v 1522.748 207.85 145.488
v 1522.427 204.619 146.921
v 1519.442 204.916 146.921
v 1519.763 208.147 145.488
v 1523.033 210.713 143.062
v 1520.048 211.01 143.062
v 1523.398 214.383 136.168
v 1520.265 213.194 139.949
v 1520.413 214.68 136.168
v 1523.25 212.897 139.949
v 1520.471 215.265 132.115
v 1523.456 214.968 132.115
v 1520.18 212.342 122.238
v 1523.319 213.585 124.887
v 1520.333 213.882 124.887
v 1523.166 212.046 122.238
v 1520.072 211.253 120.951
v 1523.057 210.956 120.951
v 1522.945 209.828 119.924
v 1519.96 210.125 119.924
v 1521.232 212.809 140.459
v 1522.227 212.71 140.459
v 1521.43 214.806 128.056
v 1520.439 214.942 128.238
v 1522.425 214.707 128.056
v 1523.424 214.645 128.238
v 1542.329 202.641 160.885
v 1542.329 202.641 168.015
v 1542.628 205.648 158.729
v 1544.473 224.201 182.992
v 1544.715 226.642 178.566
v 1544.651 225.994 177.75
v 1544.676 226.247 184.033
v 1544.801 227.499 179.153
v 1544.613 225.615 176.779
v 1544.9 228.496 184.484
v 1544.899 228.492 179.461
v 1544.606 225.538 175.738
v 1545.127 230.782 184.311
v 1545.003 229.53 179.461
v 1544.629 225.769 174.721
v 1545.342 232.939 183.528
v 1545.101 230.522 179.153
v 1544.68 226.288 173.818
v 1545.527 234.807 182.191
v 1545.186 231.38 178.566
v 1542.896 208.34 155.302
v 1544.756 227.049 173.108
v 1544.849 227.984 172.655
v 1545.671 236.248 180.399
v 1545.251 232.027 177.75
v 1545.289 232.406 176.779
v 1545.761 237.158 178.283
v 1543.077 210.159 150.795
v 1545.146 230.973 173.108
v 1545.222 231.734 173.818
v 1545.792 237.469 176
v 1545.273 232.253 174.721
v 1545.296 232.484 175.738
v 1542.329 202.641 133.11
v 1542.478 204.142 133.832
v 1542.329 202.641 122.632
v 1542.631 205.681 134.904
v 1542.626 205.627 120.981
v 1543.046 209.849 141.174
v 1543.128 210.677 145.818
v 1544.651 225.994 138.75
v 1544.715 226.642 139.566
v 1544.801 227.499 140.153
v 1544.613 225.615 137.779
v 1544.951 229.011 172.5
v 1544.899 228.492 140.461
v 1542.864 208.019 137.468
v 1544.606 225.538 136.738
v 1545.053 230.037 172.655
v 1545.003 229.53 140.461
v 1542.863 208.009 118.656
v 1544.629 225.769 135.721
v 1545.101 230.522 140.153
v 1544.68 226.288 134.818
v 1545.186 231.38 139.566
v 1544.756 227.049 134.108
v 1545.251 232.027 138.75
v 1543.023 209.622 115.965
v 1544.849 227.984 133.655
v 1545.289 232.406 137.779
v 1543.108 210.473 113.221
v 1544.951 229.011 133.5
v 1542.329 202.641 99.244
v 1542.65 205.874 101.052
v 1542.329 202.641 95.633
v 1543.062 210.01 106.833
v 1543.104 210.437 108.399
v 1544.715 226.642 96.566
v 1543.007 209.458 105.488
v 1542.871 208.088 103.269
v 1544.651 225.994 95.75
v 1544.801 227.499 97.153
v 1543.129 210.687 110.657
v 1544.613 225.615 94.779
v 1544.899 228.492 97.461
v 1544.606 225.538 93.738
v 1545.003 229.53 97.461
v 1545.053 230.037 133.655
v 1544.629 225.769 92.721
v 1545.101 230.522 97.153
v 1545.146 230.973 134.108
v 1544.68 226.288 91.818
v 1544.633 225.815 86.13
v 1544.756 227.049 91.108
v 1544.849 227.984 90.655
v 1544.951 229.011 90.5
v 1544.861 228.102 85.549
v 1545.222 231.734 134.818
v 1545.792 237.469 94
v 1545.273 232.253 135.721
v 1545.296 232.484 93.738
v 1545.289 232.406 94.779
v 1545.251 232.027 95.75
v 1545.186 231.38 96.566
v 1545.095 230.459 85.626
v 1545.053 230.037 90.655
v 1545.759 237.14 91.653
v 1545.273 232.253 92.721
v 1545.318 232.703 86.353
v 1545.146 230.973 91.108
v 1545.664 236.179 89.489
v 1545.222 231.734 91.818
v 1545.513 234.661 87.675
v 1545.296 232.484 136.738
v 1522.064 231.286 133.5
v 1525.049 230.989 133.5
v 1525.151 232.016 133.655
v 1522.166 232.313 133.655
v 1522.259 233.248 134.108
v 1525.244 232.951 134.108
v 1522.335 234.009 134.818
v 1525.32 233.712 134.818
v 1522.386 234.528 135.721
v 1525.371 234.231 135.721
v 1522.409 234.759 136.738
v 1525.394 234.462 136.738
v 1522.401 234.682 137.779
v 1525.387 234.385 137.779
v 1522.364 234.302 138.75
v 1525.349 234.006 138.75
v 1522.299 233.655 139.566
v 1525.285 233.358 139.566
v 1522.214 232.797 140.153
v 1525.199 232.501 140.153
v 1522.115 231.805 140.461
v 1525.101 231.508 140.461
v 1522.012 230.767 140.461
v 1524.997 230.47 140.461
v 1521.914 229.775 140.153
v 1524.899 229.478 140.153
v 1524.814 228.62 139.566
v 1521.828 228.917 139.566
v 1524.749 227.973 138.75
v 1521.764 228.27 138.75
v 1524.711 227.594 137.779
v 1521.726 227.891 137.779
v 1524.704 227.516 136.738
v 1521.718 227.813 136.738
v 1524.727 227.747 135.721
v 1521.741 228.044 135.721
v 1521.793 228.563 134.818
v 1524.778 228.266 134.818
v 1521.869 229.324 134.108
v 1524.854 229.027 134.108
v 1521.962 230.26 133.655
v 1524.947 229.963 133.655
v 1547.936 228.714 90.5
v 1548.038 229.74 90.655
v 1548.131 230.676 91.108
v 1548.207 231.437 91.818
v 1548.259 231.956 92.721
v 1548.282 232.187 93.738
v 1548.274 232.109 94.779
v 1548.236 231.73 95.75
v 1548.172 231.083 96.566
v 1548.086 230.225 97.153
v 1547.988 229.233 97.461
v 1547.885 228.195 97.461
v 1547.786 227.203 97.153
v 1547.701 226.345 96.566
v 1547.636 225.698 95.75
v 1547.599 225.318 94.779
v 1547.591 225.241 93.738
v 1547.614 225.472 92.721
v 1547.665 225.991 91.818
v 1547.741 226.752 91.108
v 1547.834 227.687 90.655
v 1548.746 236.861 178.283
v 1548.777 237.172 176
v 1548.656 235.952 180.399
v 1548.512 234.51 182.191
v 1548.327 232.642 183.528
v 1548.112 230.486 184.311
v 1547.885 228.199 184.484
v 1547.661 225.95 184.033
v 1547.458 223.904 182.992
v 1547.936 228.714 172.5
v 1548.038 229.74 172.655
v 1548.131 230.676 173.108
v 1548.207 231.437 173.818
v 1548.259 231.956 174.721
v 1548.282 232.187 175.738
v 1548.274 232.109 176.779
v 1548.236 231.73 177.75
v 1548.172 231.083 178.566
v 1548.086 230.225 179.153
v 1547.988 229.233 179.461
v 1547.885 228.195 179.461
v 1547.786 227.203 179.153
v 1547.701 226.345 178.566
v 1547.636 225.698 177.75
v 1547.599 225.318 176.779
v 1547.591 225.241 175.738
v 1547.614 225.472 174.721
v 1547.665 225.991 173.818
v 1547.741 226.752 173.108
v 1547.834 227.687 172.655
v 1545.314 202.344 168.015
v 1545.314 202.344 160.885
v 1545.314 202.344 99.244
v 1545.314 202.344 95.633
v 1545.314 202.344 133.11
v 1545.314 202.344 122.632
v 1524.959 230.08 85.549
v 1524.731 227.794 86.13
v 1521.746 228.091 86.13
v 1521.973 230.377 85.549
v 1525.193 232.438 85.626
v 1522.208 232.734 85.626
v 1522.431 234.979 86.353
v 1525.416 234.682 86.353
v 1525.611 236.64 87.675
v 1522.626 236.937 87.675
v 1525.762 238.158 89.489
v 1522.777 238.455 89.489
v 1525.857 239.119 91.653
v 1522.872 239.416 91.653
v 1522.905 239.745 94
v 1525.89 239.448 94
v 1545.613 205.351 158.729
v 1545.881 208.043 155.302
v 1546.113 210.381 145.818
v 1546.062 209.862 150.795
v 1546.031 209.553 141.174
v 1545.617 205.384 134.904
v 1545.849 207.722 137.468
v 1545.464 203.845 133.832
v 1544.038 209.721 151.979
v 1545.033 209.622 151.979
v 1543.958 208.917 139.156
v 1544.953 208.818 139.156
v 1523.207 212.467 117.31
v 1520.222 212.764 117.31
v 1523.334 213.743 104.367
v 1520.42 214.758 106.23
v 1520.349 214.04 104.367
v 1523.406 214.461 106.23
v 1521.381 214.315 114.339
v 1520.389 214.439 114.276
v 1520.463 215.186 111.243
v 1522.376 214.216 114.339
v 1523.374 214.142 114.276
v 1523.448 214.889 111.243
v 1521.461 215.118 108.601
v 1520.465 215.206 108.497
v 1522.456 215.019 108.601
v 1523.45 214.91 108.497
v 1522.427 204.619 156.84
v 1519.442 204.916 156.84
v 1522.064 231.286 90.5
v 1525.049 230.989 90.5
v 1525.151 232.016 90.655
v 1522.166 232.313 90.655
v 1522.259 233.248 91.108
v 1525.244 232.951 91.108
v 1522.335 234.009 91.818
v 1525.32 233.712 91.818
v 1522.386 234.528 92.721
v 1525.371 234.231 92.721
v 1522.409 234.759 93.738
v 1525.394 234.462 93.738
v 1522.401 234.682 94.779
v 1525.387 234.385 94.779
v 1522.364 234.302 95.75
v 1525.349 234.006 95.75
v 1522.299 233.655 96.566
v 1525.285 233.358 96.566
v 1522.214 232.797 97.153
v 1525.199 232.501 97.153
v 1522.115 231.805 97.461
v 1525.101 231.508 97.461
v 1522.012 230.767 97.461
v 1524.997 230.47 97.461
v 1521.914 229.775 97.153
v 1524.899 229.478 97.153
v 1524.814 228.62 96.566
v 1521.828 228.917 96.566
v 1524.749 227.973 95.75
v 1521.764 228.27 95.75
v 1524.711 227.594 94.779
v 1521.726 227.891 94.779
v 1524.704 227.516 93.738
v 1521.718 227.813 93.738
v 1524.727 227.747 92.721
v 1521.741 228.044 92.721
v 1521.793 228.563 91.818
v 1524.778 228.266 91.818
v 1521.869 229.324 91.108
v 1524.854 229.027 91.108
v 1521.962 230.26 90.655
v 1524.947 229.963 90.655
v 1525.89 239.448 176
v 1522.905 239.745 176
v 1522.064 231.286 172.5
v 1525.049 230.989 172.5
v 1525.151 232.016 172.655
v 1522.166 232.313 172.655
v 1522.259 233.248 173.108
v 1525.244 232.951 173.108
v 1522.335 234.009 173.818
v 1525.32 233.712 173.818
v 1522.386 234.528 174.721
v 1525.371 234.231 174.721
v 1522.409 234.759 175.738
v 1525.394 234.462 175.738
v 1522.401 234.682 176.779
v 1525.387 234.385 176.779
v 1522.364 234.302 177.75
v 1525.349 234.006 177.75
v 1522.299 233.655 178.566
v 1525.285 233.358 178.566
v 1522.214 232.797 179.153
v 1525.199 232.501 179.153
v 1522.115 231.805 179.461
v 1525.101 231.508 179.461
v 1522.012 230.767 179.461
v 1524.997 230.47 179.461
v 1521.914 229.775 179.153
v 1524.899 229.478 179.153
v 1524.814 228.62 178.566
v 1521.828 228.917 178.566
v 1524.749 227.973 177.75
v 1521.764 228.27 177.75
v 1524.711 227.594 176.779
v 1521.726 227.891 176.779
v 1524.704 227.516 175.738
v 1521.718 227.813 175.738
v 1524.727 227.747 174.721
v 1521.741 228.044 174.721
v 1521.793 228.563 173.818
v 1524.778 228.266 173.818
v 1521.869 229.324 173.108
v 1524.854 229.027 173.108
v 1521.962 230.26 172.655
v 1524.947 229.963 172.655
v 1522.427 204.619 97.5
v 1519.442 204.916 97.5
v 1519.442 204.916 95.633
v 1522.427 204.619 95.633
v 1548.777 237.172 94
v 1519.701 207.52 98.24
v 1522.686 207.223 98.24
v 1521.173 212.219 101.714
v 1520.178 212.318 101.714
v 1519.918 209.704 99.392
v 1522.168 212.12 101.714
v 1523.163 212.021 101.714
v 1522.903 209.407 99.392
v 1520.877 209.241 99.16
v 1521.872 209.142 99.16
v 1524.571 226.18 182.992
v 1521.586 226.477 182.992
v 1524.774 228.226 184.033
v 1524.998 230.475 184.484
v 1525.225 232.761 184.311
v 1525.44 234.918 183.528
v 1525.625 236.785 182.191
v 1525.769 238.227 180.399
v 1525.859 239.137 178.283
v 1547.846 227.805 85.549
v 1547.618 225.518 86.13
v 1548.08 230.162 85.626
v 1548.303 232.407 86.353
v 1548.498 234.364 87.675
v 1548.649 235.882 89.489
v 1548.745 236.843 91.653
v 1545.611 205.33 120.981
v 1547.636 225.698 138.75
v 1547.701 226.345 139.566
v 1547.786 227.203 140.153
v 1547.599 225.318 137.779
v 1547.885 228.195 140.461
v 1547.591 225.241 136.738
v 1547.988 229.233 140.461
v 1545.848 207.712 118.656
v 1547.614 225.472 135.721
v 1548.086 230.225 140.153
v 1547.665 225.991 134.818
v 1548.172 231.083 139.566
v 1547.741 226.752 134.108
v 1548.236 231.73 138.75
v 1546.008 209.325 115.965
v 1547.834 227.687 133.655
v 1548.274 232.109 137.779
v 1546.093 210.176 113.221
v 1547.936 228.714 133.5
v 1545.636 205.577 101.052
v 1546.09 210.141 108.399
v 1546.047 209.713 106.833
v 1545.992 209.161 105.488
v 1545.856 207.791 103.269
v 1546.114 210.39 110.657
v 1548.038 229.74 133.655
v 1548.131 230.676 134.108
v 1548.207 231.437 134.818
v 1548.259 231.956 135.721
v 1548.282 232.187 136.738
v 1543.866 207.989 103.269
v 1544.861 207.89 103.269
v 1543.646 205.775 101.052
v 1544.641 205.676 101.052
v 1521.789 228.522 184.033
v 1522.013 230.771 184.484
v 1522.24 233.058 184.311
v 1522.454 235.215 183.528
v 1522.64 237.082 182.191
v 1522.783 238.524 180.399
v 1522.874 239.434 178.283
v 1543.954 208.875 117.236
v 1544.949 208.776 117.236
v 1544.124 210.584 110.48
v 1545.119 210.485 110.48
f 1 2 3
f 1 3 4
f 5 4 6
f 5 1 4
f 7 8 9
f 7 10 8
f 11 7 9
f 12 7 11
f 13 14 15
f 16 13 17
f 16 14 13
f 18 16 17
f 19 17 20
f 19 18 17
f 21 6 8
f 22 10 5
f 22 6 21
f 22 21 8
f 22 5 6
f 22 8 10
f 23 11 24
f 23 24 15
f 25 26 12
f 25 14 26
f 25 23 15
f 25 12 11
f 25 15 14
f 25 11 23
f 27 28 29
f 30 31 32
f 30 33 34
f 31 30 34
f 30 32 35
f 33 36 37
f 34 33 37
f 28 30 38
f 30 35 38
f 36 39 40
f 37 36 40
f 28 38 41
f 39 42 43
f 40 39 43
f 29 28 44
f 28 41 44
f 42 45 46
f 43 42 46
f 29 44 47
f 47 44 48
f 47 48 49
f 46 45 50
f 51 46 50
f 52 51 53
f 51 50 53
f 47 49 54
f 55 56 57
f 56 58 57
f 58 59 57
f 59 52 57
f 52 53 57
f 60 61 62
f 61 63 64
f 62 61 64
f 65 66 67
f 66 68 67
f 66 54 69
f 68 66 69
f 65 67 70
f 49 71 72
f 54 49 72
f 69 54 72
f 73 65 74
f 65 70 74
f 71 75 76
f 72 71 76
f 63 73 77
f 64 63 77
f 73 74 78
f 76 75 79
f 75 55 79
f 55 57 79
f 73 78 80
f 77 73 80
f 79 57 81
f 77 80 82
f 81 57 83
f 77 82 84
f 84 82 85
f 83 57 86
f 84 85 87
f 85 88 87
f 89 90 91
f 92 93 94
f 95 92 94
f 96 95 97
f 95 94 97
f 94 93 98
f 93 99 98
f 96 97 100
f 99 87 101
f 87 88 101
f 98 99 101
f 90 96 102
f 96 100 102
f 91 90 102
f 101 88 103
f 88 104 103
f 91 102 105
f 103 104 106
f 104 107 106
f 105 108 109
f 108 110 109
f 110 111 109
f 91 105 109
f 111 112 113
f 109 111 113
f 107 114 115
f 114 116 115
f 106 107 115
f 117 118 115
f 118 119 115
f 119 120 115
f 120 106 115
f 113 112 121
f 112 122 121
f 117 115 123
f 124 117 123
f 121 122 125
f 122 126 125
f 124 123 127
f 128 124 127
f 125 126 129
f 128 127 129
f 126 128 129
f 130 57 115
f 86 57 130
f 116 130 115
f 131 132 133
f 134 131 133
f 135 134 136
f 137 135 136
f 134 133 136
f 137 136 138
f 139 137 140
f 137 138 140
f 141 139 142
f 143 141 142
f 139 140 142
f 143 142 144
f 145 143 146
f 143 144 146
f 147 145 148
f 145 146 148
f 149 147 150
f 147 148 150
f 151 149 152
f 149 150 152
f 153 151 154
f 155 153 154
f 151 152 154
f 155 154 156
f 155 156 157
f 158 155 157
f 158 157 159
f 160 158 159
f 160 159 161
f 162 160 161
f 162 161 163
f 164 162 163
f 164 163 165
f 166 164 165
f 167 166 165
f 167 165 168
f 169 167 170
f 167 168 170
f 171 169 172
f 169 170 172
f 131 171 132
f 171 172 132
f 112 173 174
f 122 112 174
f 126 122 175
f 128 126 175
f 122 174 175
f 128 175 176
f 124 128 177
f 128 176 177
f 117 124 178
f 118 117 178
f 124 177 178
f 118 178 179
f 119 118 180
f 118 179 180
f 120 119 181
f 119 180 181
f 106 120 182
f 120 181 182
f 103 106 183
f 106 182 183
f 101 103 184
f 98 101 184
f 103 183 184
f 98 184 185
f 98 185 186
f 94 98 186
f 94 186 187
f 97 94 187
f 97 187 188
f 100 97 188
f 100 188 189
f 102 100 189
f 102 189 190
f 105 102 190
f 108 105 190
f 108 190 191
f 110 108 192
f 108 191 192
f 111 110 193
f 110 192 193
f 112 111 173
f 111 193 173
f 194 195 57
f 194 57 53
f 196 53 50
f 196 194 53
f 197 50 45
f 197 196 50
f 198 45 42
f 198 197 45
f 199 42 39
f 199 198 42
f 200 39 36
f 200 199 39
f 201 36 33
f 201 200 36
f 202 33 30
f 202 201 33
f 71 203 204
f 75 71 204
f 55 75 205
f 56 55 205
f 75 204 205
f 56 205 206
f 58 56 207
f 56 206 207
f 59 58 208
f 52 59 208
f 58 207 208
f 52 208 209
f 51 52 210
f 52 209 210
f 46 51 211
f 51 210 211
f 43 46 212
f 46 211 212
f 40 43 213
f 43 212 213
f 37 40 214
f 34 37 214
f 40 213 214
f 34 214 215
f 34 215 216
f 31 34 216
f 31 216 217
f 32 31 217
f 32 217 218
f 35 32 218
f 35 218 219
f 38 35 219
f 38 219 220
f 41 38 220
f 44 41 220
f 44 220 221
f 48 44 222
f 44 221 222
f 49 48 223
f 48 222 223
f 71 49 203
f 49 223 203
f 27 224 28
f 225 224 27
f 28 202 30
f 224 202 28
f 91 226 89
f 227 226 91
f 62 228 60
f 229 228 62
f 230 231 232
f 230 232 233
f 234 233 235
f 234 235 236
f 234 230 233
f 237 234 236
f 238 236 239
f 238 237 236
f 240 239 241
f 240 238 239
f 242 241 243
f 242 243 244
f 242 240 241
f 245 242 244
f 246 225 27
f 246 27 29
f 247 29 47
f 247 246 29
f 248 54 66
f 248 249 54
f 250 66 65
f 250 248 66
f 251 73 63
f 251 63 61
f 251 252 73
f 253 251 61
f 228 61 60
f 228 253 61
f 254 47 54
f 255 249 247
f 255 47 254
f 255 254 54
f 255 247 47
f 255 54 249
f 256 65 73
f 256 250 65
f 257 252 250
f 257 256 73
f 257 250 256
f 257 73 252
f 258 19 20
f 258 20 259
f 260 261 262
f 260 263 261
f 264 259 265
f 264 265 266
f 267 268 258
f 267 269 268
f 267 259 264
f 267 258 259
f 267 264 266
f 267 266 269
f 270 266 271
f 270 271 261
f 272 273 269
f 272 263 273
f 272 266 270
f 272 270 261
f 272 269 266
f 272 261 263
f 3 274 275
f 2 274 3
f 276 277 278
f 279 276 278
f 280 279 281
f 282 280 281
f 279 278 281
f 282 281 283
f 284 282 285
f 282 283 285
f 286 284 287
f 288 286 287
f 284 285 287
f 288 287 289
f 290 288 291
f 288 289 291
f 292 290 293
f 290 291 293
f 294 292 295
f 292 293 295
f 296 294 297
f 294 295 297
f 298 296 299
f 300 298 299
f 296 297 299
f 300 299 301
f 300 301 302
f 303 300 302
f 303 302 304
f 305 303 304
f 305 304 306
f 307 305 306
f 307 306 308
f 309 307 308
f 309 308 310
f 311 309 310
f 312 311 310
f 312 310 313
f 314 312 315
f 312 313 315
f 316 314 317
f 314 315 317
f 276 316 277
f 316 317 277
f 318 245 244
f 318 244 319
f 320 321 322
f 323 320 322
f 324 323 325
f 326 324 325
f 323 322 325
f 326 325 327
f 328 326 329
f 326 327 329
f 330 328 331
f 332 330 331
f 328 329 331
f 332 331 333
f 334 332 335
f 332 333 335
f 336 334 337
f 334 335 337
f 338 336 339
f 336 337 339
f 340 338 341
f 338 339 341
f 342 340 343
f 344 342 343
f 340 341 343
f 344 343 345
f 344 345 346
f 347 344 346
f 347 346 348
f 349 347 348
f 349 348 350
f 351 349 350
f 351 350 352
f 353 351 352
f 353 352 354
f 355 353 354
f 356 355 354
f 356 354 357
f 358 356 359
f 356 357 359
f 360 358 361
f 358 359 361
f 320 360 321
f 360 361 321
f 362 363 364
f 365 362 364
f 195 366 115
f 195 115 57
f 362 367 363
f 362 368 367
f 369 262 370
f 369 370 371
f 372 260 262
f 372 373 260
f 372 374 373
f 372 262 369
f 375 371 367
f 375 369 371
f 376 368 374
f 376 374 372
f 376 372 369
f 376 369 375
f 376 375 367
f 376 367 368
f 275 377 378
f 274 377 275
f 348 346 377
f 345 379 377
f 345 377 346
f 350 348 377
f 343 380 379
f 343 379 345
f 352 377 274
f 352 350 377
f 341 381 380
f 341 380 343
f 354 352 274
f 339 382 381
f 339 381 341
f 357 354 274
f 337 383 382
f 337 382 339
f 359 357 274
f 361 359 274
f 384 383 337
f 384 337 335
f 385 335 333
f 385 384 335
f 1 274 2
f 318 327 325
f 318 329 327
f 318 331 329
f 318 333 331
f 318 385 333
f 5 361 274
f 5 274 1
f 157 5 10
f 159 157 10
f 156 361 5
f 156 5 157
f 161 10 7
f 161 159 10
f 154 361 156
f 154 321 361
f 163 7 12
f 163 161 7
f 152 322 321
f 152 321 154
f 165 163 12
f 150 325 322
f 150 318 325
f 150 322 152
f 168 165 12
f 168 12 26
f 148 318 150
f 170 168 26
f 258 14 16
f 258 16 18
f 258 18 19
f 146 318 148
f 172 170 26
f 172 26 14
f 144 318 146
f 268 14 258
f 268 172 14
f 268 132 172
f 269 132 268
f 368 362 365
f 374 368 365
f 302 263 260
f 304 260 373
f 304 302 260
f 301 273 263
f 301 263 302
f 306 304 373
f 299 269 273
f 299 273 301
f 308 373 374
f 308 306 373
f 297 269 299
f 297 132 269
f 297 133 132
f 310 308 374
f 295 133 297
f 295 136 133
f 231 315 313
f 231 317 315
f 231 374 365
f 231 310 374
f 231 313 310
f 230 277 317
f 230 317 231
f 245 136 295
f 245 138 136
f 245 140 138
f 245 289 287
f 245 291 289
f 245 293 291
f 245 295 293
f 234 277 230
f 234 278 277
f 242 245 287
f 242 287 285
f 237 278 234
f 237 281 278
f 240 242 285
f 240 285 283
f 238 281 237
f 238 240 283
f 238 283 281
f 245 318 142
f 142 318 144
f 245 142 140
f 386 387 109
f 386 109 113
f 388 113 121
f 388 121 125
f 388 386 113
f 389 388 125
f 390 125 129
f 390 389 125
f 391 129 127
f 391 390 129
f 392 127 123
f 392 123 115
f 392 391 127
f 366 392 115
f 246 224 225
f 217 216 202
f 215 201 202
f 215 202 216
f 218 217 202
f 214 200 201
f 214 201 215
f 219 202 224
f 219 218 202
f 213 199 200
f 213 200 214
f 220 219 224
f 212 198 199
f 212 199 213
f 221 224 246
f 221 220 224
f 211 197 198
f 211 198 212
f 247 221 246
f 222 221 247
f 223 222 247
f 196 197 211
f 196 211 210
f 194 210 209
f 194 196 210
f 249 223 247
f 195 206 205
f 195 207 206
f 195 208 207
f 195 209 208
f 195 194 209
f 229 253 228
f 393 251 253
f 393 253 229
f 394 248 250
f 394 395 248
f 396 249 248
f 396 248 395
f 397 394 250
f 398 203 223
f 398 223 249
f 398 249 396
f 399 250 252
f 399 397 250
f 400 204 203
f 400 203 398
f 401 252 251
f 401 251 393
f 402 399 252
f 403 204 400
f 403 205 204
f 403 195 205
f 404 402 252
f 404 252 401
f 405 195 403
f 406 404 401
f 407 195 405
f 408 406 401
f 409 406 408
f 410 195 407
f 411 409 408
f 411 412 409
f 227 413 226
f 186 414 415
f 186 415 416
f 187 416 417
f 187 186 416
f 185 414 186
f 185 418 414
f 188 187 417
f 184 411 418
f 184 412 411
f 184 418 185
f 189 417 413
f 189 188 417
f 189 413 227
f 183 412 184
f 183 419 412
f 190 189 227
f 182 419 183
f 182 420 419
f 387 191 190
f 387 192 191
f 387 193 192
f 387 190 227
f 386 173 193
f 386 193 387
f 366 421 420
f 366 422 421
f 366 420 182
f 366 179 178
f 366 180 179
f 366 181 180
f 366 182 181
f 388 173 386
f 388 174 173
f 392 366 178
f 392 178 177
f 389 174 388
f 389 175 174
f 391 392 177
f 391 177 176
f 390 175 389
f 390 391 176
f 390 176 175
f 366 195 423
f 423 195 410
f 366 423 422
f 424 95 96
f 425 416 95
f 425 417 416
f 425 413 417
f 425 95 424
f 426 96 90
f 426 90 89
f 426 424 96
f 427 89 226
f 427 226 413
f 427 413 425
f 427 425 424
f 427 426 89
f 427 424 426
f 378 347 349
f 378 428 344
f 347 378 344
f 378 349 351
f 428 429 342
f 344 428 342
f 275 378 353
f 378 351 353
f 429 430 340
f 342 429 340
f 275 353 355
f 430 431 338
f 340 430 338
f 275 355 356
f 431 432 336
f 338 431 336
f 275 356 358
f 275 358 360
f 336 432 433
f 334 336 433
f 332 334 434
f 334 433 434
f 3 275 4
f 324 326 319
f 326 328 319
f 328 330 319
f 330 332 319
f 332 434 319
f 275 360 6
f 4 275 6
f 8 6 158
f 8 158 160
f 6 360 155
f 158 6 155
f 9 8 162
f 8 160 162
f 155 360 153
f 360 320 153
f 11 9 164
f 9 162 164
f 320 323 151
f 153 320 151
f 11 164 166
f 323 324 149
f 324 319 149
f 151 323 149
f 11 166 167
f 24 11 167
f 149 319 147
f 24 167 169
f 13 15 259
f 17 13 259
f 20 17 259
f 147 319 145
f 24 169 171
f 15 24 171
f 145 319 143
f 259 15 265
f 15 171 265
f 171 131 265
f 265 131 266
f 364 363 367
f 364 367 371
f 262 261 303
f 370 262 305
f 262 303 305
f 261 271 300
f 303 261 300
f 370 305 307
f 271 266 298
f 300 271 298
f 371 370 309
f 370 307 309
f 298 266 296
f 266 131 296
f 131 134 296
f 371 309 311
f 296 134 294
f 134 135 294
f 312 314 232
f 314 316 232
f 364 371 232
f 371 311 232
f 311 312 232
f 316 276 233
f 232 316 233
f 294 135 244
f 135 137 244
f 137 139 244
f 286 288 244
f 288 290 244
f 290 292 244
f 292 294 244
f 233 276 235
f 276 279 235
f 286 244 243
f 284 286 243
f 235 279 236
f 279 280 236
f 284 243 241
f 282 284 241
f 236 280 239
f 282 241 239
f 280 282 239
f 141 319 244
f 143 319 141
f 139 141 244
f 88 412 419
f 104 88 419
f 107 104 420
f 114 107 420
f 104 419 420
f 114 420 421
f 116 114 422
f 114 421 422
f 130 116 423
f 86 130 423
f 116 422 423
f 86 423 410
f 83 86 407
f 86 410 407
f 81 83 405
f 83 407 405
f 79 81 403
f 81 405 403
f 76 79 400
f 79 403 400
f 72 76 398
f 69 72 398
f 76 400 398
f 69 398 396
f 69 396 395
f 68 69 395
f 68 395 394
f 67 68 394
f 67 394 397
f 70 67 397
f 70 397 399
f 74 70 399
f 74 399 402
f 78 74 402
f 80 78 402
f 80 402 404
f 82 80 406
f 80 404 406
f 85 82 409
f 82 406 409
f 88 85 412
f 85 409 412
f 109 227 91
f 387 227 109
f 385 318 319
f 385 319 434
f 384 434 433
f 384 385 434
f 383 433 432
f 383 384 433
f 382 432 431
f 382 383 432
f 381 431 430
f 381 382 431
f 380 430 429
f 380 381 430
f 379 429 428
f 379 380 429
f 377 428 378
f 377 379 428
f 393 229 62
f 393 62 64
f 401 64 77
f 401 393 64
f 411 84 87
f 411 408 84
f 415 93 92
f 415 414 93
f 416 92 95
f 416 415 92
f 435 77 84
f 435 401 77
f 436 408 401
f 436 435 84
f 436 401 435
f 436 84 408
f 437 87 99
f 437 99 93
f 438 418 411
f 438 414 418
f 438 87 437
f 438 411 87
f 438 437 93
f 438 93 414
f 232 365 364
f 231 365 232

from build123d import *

# Parameters (mm, degrees)
SZKIC1_R                    = 3.5
DODANIE_WYCI_GNI_CIE1_DEPTH = 3
SZKIC2_R                    = 3.5
DODANIE_WYCI_GNI_CIE2_DEPTH = 3


with BuildPart() as part:
    # Szkic1 → Dodanie-wyciągnięcie1 (new body)
    with BuildSketch(Plane(origin=(1510.26539917, -150.162347119, 0), x_dir=(0, 0, -1), z_dir=(0.995093407, -0.098939936, 0))):
        with BuildLine():
            Line((-94, 389.244285112), (-176, 389.244285112))
            ThreePointArc((-176, 389.244285112), (-183.527682005, 384.691943106), (-182.99216801, 375.911109497))
            Line((-182.99216801, 375.911109497), (-168.015473067, 354.244285112))
            Line((-168.015473067, 354.244285112), (-160.885440505, 354.244285112))
            add(Edge.make_bspline(
                [(-160.885440505, 354.244285112), (-153.785636141, 368.019539208), (-137.697083979, 366.114436311), (-133.110394172, 354.244285112)],
                knots=[0.109763154, 0.109763154, 0.109763154, 0.109763154, 0.458625023, 0.458625023, 0.458625023, 0.458625023], degree=3, weights=[0.657330984, 0.39640678, 0.460028186, 0.848195201]))
            Line((-133.110394172, 354.244285112), (-122.632192473, 354.244285112))
            add(Edge.make_bspline(
                [(-122.632192473, 354.244285112), (-119.408973744, 362.626222554), (-111.475333465, 363.988172278), (-105.487616035, 361.094928434)],
                knots=[0.739553983, 0.739553983, 0.739553983, 0.739553983, 1, 1, 1, 1], degree=3, weights=[0.500872954, 0.486362962, 0.652738644, 1]))
            add(Edge.make_bspline(
                [(-105.487616035, 361.094928434), (-102.846358705, 359.818682251), (-100.484996274, 357.554609079), (-99.24420603, 354.244285112)],
                knots=[0, 0, 0, 0, 0.142552622, 0.142552622, 0.142552622, 0.142552622], degree=3, weights=[1, 0.809929837, 0.674049674, 0.592359511]))
            Line((-99.24420603, 354.244285112), (-95.633072844, 354.244285112))
            Line((-95.633072844, 354.244285112), (-86.130002131, 377.532878327))
            ThreePointArc((-86.130002131, 377.532878327), (-86.944967836, 385.485226069), (-94, 389.244285112))
        make_face()
        with Locations((-176, 380.744285112)):
            Circle(SZKIC1_R, mode=Mode.SUBTRACT)
        with Locations((-137, 380.744285112)):
            Circle(SZKIC1_R, mode=Mode.SUBTRACT)
        with Locations((-94, 380.744285112)):
            Circle(SZKIC1_R, mode=Mode.SUBTRACT)
    extrude(amount=-DODANIE_WYCI_GNI_CIE1_DEPTH)


with BuildPart() as body_2:
    # Szkic2 → Dodanie-wyciągnięcie2 (new body)
    with BuildSketch(Plane(origin=(1487.378250803, -147.886728596, 0), x_dir=(0, 0, -1), z_dir=(0.995093407, -0.098939936, 0))):
        with BuildLine():
            Line((-94, 389.244285112), (-176, 389.244285112))
            ThreePointArc((-176, 389.244285112), (-183.527682005, 384.691943106), (-182.99216801, 375.911109497))
            Line((-182.99216801, 375.911109497), (-156.840444696, 354.244285112))
            Line((-156.840444696, 354.244285112), (-146.921435672, 354.244285112))
            add(Edge.make_bspline(
                [(-146.921435672, 354.244285112), (-143.327169377, 367.52658758), (-127.980702926, 369.59903975), (-119.923911954, 359.478696835)],
                knots=[0.548877144, 0.548877144, 0.548877144, 0.548877144, 1, 1, 1, 1], degree=3, weights=[0.875864545, 0.535330773, 0.576709258, 1]))
            add(Edge.make_bspline(
                [(-119.923911954, 359.478696835), (-115.699468449, 365.269367694), (-109.261173327, 365.77778435), (-104.36745598, 363.413157469)],
                knots=[0.772719047, 0.772719047, 0.772719047, 0.772719047, 1, 1, 1, 1], degree=3, weights=[0.504129241, 0.531668476, 0.696958729, 1]))
            add(Edge.make_bspline(
                [(-104.36745598, 363.413157469), (-101.071249639, 361.820442245), (-98.258408522, 358.737930894), (-97.500362288, 354.244285112)],
                knots=[0, 0, 0, 0, 0.169893861, 0.169893861, 0.169893861, 0.169893861], degree=3, weights=[1, 0.773474852, 0.623920168, 0.551335948]))
            Line((-97.500362288, 354.244285112), (-95.633072844, 354.244285112))
            Line((-95.633072844, 354.244285112), (-86.130002131, 377.532878327))
            ThreePointArc((-86.130002131, 377.532878327), (-86.944967836, 385.485226069), (-94, 389.244285112))
        make_face()
        with Locations((-176, 380.744285112)):
            Circle(SZKIC2_R, mode=Mode.SUBTRACT)
        with Locations((-137, 380.744285112)):
            Circle(SZKIC2_R, mode=Mode.SUBTRACT)
        with Locations((-94, 380.744285112)):
            Circle(SZKIC2_R, mode=Mode.SUBTRACT)
    extrude(amount=-DODANIE_WYCI_GNI_CIE2_DEPTH)


solid = Compound([part.part, body_2.part])
